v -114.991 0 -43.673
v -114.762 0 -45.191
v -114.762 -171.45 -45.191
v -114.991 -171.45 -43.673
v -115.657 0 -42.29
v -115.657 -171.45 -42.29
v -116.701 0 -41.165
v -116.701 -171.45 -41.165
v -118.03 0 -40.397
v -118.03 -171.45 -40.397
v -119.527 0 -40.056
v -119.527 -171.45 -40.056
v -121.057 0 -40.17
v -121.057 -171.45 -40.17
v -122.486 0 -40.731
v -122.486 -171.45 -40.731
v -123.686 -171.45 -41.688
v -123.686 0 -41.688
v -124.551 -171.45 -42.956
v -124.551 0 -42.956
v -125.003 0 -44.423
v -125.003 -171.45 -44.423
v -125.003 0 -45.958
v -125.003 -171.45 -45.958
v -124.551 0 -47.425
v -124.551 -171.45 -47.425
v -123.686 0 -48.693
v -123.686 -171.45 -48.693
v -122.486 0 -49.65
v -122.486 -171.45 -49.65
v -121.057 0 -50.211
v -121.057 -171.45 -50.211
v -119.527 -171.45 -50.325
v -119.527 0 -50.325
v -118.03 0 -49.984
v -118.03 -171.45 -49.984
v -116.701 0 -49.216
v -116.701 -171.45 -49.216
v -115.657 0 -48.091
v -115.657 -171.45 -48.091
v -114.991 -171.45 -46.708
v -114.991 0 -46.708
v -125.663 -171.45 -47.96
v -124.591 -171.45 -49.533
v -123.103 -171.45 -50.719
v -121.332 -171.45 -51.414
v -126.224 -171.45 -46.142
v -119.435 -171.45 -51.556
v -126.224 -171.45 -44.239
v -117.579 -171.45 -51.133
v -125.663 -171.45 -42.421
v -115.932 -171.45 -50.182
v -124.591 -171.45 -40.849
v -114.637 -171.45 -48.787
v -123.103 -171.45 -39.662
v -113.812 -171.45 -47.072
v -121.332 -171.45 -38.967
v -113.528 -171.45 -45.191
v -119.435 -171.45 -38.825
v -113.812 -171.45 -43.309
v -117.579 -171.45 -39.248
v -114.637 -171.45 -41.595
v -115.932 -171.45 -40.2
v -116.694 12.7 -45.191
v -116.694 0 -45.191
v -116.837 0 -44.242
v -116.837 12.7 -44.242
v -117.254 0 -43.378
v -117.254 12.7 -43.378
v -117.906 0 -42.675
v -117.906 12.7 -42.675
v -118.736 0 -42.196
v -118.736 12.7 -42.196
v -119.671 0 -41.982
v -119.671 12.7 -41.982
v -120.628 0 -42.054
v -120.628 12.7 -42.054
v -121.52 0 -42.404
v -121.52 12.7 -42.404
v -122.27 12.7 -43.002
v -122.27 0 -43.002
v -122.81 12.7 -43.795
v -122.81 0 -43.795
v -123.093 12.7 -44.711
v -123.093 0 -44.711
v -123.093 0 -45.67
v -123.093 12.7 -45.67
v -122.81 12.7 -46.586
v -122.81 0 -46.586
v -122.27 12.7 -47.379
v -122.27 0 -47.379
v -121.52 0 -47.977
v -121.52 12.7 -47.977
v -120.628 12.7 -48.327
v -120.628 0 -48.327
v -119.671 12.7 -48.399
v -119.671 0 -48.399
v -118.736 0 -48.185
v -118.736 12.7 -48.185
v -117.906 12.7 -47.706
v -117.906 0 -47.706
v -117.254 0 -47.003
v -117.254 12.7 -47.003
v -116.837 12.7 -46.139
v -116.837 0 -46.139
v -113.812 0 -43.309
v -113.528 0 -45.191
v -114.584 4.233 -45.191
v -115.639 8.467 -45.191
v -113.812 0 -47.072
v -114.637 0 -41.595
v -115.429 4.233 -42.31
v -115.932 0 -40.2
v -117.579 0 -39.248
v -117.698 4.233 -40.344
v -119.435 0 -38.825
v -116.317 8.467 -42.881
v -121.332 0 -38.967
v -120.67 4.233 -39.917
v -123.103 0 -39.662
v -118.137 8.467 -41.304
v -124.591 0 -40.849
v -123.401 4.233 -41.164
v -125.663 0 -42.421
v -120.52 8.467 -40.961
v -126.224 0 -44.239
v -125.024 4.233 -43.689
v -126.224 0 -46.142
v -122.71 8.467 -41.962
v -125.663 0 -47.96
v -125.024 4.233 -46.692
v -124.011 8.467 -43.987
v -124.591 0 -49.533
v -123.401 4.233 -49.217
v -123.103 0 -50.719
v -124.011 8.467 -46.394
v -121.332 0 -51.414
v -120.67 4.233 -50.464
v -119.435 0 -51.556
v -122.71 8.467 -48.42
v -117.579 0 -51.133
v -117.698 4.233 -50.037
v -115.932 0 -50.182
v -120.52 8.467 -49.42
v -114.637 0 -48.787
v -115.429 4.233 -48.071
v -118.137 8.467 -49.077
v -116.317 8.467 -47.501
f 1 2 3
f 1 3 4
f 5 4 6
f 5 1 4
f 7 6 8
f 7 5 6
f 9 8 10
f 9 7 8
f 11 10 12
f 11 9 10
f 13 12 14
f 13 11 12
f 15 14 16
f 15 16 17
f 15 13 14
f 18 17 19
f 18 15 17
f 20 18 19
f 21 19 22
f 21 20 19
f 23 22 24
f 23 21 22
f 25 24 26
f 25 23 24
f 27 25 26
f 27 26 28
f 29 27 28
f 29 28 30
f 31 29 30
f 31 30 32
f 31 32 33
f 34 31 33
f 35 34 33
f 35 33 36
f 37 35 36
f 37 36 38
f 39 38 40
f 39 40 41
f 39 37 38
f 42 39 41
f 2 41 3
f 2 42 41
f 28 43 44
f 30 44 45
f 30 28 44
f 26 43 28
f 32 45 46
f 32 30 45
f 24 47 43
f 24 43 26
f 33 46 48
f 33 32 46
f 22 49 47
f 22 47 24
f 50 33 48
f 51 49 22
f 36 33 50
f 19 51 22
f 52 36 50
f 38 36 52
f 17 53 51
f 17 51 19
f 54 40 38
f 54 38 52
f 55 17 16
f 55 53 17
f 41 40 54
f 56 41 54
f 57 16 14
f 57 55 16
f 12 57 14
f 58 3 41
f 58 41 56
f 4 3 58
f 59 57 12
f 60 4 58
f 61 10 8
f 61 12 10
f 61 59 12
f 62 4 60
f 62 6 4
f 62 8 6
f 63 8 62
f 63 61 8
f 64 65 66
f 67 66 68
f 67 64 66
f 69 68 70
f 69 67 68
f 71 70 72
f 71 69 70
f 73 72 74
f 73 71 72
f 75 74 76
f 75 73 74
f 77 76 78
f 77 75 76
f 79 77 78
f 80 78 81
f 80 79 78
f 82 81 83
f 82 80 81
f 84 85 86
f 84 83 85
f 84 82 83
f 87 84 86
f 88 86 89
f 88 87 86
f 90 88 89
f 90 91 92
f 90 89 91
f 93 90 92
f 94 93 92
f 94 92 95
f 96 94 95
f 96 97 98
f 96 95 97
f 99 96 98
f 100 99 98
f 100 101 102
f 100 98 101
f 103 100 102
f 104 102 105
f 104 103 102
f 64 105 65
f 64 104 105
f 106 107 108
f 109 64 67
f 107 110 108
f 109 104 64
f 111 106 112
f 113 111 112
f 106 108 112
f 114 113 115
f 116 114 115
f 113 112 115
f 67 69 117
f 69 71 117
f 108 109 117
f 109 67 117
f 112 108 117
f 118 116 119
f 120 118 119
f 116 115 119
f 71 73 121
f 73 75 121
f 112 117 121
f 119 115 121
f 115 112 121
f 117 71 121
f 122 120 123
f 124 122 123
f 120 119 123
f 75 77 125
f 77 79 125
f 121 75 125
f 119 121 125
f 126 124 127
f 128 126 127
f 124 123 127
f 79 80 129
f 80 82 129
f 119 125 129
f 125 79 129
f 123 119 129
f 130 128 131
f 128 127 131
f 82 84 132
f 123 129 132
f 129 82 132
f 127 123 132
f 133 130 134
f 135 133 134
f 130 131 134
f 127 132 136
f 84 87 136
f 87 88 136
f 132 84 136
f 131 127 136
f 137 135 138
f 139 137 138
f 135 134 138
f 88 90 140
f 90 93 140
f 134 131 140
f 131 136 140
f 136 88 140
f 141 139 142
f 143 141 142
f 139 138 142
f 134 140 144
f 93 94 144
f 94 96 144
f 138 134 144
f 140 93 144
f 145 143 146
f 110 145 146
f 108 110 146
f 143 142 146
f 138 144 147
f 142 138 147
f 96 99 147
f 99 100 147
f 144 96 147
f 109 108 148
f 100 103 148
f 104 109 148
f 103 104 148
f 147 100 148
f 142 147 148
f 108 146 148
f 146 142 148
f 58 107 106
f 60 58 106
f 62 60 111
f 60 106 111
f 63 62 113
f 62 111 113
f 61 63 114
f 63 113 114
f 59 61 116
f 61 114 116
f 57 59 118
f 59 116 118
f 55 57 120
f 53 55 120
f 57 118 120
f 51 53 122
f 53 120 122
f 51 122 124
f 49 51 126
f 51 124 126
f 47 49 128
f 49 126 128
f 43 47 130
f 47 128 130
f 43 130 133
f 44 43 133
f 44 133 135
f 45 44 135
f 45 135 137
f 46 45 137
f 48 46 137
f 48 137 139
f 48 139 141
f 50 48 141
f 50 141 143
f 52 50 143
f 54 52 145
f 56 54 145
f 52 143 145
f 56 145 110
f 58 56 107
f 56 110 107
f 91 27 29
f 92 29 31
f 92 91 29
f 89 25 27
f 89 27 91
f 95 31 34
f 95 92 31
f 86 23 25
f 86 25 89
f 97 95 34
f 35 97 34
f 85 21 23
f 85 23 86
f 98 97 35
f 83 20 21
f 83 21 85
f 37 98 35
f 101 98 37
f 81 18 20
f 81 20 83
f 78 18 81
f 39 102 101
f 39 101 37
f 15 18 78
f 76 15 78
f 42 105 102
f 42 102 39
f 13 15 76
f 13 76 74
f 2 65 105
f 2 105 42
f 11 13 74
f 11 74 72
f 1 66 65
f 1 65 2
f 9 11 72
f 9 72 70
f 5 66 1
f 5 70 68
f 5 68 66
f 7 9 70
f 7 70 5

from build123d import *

# Parameters (mm, degrees)
F0_R     = 6.3836352682
F1_DEPTH = 171.45
F4_R     = 5.1492450533
F5_DEPTH = 171.45
F6_DEPTH = 12.7
F6_TAPER = 14
F8_DEPTH = 25.654


# Not quite as in the source:
# - the program builds the solid bodies; features that only make, move or delete a surface that nothing else refers to are left out


with BuildPart() as f1:
    # F0 (on Front) → F1 (new body)
    with BuildSketch(Plane.XZ):
        with Locations((-119.9116557837, -45.1905839145)):
            Circle(F0_R)
    extrude(amount=F1_DEPTH)

    # F4 (on Front) → F5 (cut)
    with BuildSketch(Plane.XZ):
        with Locations((-119.9116557837, -45.1905839145)):
            Circle(F4_R)
    extrude(amount=F5_DEPTH, mode=Mode.SUBTRACT)

    # F0 (on Front) → F6 (join)
    with BuildSketch(Plane.XZ):
        with Locations((-119.9116557837, -45.1905839145)):
            Circle(F0_R)
    extrude(amount=-F6_DEPTH, taper=F6_TAPER)

    # F8 (cut): a face of the model
    f8_faces = [f1.faces().sort_by_distance(p)[0] for p in [
        (-119.9116557837, 12.7, -45.1905839145),
    ]]
    extrude(f8_faces, amount=-F8_DEPTH, mode=Mode.SUBTRACT)


solid = f1.part
